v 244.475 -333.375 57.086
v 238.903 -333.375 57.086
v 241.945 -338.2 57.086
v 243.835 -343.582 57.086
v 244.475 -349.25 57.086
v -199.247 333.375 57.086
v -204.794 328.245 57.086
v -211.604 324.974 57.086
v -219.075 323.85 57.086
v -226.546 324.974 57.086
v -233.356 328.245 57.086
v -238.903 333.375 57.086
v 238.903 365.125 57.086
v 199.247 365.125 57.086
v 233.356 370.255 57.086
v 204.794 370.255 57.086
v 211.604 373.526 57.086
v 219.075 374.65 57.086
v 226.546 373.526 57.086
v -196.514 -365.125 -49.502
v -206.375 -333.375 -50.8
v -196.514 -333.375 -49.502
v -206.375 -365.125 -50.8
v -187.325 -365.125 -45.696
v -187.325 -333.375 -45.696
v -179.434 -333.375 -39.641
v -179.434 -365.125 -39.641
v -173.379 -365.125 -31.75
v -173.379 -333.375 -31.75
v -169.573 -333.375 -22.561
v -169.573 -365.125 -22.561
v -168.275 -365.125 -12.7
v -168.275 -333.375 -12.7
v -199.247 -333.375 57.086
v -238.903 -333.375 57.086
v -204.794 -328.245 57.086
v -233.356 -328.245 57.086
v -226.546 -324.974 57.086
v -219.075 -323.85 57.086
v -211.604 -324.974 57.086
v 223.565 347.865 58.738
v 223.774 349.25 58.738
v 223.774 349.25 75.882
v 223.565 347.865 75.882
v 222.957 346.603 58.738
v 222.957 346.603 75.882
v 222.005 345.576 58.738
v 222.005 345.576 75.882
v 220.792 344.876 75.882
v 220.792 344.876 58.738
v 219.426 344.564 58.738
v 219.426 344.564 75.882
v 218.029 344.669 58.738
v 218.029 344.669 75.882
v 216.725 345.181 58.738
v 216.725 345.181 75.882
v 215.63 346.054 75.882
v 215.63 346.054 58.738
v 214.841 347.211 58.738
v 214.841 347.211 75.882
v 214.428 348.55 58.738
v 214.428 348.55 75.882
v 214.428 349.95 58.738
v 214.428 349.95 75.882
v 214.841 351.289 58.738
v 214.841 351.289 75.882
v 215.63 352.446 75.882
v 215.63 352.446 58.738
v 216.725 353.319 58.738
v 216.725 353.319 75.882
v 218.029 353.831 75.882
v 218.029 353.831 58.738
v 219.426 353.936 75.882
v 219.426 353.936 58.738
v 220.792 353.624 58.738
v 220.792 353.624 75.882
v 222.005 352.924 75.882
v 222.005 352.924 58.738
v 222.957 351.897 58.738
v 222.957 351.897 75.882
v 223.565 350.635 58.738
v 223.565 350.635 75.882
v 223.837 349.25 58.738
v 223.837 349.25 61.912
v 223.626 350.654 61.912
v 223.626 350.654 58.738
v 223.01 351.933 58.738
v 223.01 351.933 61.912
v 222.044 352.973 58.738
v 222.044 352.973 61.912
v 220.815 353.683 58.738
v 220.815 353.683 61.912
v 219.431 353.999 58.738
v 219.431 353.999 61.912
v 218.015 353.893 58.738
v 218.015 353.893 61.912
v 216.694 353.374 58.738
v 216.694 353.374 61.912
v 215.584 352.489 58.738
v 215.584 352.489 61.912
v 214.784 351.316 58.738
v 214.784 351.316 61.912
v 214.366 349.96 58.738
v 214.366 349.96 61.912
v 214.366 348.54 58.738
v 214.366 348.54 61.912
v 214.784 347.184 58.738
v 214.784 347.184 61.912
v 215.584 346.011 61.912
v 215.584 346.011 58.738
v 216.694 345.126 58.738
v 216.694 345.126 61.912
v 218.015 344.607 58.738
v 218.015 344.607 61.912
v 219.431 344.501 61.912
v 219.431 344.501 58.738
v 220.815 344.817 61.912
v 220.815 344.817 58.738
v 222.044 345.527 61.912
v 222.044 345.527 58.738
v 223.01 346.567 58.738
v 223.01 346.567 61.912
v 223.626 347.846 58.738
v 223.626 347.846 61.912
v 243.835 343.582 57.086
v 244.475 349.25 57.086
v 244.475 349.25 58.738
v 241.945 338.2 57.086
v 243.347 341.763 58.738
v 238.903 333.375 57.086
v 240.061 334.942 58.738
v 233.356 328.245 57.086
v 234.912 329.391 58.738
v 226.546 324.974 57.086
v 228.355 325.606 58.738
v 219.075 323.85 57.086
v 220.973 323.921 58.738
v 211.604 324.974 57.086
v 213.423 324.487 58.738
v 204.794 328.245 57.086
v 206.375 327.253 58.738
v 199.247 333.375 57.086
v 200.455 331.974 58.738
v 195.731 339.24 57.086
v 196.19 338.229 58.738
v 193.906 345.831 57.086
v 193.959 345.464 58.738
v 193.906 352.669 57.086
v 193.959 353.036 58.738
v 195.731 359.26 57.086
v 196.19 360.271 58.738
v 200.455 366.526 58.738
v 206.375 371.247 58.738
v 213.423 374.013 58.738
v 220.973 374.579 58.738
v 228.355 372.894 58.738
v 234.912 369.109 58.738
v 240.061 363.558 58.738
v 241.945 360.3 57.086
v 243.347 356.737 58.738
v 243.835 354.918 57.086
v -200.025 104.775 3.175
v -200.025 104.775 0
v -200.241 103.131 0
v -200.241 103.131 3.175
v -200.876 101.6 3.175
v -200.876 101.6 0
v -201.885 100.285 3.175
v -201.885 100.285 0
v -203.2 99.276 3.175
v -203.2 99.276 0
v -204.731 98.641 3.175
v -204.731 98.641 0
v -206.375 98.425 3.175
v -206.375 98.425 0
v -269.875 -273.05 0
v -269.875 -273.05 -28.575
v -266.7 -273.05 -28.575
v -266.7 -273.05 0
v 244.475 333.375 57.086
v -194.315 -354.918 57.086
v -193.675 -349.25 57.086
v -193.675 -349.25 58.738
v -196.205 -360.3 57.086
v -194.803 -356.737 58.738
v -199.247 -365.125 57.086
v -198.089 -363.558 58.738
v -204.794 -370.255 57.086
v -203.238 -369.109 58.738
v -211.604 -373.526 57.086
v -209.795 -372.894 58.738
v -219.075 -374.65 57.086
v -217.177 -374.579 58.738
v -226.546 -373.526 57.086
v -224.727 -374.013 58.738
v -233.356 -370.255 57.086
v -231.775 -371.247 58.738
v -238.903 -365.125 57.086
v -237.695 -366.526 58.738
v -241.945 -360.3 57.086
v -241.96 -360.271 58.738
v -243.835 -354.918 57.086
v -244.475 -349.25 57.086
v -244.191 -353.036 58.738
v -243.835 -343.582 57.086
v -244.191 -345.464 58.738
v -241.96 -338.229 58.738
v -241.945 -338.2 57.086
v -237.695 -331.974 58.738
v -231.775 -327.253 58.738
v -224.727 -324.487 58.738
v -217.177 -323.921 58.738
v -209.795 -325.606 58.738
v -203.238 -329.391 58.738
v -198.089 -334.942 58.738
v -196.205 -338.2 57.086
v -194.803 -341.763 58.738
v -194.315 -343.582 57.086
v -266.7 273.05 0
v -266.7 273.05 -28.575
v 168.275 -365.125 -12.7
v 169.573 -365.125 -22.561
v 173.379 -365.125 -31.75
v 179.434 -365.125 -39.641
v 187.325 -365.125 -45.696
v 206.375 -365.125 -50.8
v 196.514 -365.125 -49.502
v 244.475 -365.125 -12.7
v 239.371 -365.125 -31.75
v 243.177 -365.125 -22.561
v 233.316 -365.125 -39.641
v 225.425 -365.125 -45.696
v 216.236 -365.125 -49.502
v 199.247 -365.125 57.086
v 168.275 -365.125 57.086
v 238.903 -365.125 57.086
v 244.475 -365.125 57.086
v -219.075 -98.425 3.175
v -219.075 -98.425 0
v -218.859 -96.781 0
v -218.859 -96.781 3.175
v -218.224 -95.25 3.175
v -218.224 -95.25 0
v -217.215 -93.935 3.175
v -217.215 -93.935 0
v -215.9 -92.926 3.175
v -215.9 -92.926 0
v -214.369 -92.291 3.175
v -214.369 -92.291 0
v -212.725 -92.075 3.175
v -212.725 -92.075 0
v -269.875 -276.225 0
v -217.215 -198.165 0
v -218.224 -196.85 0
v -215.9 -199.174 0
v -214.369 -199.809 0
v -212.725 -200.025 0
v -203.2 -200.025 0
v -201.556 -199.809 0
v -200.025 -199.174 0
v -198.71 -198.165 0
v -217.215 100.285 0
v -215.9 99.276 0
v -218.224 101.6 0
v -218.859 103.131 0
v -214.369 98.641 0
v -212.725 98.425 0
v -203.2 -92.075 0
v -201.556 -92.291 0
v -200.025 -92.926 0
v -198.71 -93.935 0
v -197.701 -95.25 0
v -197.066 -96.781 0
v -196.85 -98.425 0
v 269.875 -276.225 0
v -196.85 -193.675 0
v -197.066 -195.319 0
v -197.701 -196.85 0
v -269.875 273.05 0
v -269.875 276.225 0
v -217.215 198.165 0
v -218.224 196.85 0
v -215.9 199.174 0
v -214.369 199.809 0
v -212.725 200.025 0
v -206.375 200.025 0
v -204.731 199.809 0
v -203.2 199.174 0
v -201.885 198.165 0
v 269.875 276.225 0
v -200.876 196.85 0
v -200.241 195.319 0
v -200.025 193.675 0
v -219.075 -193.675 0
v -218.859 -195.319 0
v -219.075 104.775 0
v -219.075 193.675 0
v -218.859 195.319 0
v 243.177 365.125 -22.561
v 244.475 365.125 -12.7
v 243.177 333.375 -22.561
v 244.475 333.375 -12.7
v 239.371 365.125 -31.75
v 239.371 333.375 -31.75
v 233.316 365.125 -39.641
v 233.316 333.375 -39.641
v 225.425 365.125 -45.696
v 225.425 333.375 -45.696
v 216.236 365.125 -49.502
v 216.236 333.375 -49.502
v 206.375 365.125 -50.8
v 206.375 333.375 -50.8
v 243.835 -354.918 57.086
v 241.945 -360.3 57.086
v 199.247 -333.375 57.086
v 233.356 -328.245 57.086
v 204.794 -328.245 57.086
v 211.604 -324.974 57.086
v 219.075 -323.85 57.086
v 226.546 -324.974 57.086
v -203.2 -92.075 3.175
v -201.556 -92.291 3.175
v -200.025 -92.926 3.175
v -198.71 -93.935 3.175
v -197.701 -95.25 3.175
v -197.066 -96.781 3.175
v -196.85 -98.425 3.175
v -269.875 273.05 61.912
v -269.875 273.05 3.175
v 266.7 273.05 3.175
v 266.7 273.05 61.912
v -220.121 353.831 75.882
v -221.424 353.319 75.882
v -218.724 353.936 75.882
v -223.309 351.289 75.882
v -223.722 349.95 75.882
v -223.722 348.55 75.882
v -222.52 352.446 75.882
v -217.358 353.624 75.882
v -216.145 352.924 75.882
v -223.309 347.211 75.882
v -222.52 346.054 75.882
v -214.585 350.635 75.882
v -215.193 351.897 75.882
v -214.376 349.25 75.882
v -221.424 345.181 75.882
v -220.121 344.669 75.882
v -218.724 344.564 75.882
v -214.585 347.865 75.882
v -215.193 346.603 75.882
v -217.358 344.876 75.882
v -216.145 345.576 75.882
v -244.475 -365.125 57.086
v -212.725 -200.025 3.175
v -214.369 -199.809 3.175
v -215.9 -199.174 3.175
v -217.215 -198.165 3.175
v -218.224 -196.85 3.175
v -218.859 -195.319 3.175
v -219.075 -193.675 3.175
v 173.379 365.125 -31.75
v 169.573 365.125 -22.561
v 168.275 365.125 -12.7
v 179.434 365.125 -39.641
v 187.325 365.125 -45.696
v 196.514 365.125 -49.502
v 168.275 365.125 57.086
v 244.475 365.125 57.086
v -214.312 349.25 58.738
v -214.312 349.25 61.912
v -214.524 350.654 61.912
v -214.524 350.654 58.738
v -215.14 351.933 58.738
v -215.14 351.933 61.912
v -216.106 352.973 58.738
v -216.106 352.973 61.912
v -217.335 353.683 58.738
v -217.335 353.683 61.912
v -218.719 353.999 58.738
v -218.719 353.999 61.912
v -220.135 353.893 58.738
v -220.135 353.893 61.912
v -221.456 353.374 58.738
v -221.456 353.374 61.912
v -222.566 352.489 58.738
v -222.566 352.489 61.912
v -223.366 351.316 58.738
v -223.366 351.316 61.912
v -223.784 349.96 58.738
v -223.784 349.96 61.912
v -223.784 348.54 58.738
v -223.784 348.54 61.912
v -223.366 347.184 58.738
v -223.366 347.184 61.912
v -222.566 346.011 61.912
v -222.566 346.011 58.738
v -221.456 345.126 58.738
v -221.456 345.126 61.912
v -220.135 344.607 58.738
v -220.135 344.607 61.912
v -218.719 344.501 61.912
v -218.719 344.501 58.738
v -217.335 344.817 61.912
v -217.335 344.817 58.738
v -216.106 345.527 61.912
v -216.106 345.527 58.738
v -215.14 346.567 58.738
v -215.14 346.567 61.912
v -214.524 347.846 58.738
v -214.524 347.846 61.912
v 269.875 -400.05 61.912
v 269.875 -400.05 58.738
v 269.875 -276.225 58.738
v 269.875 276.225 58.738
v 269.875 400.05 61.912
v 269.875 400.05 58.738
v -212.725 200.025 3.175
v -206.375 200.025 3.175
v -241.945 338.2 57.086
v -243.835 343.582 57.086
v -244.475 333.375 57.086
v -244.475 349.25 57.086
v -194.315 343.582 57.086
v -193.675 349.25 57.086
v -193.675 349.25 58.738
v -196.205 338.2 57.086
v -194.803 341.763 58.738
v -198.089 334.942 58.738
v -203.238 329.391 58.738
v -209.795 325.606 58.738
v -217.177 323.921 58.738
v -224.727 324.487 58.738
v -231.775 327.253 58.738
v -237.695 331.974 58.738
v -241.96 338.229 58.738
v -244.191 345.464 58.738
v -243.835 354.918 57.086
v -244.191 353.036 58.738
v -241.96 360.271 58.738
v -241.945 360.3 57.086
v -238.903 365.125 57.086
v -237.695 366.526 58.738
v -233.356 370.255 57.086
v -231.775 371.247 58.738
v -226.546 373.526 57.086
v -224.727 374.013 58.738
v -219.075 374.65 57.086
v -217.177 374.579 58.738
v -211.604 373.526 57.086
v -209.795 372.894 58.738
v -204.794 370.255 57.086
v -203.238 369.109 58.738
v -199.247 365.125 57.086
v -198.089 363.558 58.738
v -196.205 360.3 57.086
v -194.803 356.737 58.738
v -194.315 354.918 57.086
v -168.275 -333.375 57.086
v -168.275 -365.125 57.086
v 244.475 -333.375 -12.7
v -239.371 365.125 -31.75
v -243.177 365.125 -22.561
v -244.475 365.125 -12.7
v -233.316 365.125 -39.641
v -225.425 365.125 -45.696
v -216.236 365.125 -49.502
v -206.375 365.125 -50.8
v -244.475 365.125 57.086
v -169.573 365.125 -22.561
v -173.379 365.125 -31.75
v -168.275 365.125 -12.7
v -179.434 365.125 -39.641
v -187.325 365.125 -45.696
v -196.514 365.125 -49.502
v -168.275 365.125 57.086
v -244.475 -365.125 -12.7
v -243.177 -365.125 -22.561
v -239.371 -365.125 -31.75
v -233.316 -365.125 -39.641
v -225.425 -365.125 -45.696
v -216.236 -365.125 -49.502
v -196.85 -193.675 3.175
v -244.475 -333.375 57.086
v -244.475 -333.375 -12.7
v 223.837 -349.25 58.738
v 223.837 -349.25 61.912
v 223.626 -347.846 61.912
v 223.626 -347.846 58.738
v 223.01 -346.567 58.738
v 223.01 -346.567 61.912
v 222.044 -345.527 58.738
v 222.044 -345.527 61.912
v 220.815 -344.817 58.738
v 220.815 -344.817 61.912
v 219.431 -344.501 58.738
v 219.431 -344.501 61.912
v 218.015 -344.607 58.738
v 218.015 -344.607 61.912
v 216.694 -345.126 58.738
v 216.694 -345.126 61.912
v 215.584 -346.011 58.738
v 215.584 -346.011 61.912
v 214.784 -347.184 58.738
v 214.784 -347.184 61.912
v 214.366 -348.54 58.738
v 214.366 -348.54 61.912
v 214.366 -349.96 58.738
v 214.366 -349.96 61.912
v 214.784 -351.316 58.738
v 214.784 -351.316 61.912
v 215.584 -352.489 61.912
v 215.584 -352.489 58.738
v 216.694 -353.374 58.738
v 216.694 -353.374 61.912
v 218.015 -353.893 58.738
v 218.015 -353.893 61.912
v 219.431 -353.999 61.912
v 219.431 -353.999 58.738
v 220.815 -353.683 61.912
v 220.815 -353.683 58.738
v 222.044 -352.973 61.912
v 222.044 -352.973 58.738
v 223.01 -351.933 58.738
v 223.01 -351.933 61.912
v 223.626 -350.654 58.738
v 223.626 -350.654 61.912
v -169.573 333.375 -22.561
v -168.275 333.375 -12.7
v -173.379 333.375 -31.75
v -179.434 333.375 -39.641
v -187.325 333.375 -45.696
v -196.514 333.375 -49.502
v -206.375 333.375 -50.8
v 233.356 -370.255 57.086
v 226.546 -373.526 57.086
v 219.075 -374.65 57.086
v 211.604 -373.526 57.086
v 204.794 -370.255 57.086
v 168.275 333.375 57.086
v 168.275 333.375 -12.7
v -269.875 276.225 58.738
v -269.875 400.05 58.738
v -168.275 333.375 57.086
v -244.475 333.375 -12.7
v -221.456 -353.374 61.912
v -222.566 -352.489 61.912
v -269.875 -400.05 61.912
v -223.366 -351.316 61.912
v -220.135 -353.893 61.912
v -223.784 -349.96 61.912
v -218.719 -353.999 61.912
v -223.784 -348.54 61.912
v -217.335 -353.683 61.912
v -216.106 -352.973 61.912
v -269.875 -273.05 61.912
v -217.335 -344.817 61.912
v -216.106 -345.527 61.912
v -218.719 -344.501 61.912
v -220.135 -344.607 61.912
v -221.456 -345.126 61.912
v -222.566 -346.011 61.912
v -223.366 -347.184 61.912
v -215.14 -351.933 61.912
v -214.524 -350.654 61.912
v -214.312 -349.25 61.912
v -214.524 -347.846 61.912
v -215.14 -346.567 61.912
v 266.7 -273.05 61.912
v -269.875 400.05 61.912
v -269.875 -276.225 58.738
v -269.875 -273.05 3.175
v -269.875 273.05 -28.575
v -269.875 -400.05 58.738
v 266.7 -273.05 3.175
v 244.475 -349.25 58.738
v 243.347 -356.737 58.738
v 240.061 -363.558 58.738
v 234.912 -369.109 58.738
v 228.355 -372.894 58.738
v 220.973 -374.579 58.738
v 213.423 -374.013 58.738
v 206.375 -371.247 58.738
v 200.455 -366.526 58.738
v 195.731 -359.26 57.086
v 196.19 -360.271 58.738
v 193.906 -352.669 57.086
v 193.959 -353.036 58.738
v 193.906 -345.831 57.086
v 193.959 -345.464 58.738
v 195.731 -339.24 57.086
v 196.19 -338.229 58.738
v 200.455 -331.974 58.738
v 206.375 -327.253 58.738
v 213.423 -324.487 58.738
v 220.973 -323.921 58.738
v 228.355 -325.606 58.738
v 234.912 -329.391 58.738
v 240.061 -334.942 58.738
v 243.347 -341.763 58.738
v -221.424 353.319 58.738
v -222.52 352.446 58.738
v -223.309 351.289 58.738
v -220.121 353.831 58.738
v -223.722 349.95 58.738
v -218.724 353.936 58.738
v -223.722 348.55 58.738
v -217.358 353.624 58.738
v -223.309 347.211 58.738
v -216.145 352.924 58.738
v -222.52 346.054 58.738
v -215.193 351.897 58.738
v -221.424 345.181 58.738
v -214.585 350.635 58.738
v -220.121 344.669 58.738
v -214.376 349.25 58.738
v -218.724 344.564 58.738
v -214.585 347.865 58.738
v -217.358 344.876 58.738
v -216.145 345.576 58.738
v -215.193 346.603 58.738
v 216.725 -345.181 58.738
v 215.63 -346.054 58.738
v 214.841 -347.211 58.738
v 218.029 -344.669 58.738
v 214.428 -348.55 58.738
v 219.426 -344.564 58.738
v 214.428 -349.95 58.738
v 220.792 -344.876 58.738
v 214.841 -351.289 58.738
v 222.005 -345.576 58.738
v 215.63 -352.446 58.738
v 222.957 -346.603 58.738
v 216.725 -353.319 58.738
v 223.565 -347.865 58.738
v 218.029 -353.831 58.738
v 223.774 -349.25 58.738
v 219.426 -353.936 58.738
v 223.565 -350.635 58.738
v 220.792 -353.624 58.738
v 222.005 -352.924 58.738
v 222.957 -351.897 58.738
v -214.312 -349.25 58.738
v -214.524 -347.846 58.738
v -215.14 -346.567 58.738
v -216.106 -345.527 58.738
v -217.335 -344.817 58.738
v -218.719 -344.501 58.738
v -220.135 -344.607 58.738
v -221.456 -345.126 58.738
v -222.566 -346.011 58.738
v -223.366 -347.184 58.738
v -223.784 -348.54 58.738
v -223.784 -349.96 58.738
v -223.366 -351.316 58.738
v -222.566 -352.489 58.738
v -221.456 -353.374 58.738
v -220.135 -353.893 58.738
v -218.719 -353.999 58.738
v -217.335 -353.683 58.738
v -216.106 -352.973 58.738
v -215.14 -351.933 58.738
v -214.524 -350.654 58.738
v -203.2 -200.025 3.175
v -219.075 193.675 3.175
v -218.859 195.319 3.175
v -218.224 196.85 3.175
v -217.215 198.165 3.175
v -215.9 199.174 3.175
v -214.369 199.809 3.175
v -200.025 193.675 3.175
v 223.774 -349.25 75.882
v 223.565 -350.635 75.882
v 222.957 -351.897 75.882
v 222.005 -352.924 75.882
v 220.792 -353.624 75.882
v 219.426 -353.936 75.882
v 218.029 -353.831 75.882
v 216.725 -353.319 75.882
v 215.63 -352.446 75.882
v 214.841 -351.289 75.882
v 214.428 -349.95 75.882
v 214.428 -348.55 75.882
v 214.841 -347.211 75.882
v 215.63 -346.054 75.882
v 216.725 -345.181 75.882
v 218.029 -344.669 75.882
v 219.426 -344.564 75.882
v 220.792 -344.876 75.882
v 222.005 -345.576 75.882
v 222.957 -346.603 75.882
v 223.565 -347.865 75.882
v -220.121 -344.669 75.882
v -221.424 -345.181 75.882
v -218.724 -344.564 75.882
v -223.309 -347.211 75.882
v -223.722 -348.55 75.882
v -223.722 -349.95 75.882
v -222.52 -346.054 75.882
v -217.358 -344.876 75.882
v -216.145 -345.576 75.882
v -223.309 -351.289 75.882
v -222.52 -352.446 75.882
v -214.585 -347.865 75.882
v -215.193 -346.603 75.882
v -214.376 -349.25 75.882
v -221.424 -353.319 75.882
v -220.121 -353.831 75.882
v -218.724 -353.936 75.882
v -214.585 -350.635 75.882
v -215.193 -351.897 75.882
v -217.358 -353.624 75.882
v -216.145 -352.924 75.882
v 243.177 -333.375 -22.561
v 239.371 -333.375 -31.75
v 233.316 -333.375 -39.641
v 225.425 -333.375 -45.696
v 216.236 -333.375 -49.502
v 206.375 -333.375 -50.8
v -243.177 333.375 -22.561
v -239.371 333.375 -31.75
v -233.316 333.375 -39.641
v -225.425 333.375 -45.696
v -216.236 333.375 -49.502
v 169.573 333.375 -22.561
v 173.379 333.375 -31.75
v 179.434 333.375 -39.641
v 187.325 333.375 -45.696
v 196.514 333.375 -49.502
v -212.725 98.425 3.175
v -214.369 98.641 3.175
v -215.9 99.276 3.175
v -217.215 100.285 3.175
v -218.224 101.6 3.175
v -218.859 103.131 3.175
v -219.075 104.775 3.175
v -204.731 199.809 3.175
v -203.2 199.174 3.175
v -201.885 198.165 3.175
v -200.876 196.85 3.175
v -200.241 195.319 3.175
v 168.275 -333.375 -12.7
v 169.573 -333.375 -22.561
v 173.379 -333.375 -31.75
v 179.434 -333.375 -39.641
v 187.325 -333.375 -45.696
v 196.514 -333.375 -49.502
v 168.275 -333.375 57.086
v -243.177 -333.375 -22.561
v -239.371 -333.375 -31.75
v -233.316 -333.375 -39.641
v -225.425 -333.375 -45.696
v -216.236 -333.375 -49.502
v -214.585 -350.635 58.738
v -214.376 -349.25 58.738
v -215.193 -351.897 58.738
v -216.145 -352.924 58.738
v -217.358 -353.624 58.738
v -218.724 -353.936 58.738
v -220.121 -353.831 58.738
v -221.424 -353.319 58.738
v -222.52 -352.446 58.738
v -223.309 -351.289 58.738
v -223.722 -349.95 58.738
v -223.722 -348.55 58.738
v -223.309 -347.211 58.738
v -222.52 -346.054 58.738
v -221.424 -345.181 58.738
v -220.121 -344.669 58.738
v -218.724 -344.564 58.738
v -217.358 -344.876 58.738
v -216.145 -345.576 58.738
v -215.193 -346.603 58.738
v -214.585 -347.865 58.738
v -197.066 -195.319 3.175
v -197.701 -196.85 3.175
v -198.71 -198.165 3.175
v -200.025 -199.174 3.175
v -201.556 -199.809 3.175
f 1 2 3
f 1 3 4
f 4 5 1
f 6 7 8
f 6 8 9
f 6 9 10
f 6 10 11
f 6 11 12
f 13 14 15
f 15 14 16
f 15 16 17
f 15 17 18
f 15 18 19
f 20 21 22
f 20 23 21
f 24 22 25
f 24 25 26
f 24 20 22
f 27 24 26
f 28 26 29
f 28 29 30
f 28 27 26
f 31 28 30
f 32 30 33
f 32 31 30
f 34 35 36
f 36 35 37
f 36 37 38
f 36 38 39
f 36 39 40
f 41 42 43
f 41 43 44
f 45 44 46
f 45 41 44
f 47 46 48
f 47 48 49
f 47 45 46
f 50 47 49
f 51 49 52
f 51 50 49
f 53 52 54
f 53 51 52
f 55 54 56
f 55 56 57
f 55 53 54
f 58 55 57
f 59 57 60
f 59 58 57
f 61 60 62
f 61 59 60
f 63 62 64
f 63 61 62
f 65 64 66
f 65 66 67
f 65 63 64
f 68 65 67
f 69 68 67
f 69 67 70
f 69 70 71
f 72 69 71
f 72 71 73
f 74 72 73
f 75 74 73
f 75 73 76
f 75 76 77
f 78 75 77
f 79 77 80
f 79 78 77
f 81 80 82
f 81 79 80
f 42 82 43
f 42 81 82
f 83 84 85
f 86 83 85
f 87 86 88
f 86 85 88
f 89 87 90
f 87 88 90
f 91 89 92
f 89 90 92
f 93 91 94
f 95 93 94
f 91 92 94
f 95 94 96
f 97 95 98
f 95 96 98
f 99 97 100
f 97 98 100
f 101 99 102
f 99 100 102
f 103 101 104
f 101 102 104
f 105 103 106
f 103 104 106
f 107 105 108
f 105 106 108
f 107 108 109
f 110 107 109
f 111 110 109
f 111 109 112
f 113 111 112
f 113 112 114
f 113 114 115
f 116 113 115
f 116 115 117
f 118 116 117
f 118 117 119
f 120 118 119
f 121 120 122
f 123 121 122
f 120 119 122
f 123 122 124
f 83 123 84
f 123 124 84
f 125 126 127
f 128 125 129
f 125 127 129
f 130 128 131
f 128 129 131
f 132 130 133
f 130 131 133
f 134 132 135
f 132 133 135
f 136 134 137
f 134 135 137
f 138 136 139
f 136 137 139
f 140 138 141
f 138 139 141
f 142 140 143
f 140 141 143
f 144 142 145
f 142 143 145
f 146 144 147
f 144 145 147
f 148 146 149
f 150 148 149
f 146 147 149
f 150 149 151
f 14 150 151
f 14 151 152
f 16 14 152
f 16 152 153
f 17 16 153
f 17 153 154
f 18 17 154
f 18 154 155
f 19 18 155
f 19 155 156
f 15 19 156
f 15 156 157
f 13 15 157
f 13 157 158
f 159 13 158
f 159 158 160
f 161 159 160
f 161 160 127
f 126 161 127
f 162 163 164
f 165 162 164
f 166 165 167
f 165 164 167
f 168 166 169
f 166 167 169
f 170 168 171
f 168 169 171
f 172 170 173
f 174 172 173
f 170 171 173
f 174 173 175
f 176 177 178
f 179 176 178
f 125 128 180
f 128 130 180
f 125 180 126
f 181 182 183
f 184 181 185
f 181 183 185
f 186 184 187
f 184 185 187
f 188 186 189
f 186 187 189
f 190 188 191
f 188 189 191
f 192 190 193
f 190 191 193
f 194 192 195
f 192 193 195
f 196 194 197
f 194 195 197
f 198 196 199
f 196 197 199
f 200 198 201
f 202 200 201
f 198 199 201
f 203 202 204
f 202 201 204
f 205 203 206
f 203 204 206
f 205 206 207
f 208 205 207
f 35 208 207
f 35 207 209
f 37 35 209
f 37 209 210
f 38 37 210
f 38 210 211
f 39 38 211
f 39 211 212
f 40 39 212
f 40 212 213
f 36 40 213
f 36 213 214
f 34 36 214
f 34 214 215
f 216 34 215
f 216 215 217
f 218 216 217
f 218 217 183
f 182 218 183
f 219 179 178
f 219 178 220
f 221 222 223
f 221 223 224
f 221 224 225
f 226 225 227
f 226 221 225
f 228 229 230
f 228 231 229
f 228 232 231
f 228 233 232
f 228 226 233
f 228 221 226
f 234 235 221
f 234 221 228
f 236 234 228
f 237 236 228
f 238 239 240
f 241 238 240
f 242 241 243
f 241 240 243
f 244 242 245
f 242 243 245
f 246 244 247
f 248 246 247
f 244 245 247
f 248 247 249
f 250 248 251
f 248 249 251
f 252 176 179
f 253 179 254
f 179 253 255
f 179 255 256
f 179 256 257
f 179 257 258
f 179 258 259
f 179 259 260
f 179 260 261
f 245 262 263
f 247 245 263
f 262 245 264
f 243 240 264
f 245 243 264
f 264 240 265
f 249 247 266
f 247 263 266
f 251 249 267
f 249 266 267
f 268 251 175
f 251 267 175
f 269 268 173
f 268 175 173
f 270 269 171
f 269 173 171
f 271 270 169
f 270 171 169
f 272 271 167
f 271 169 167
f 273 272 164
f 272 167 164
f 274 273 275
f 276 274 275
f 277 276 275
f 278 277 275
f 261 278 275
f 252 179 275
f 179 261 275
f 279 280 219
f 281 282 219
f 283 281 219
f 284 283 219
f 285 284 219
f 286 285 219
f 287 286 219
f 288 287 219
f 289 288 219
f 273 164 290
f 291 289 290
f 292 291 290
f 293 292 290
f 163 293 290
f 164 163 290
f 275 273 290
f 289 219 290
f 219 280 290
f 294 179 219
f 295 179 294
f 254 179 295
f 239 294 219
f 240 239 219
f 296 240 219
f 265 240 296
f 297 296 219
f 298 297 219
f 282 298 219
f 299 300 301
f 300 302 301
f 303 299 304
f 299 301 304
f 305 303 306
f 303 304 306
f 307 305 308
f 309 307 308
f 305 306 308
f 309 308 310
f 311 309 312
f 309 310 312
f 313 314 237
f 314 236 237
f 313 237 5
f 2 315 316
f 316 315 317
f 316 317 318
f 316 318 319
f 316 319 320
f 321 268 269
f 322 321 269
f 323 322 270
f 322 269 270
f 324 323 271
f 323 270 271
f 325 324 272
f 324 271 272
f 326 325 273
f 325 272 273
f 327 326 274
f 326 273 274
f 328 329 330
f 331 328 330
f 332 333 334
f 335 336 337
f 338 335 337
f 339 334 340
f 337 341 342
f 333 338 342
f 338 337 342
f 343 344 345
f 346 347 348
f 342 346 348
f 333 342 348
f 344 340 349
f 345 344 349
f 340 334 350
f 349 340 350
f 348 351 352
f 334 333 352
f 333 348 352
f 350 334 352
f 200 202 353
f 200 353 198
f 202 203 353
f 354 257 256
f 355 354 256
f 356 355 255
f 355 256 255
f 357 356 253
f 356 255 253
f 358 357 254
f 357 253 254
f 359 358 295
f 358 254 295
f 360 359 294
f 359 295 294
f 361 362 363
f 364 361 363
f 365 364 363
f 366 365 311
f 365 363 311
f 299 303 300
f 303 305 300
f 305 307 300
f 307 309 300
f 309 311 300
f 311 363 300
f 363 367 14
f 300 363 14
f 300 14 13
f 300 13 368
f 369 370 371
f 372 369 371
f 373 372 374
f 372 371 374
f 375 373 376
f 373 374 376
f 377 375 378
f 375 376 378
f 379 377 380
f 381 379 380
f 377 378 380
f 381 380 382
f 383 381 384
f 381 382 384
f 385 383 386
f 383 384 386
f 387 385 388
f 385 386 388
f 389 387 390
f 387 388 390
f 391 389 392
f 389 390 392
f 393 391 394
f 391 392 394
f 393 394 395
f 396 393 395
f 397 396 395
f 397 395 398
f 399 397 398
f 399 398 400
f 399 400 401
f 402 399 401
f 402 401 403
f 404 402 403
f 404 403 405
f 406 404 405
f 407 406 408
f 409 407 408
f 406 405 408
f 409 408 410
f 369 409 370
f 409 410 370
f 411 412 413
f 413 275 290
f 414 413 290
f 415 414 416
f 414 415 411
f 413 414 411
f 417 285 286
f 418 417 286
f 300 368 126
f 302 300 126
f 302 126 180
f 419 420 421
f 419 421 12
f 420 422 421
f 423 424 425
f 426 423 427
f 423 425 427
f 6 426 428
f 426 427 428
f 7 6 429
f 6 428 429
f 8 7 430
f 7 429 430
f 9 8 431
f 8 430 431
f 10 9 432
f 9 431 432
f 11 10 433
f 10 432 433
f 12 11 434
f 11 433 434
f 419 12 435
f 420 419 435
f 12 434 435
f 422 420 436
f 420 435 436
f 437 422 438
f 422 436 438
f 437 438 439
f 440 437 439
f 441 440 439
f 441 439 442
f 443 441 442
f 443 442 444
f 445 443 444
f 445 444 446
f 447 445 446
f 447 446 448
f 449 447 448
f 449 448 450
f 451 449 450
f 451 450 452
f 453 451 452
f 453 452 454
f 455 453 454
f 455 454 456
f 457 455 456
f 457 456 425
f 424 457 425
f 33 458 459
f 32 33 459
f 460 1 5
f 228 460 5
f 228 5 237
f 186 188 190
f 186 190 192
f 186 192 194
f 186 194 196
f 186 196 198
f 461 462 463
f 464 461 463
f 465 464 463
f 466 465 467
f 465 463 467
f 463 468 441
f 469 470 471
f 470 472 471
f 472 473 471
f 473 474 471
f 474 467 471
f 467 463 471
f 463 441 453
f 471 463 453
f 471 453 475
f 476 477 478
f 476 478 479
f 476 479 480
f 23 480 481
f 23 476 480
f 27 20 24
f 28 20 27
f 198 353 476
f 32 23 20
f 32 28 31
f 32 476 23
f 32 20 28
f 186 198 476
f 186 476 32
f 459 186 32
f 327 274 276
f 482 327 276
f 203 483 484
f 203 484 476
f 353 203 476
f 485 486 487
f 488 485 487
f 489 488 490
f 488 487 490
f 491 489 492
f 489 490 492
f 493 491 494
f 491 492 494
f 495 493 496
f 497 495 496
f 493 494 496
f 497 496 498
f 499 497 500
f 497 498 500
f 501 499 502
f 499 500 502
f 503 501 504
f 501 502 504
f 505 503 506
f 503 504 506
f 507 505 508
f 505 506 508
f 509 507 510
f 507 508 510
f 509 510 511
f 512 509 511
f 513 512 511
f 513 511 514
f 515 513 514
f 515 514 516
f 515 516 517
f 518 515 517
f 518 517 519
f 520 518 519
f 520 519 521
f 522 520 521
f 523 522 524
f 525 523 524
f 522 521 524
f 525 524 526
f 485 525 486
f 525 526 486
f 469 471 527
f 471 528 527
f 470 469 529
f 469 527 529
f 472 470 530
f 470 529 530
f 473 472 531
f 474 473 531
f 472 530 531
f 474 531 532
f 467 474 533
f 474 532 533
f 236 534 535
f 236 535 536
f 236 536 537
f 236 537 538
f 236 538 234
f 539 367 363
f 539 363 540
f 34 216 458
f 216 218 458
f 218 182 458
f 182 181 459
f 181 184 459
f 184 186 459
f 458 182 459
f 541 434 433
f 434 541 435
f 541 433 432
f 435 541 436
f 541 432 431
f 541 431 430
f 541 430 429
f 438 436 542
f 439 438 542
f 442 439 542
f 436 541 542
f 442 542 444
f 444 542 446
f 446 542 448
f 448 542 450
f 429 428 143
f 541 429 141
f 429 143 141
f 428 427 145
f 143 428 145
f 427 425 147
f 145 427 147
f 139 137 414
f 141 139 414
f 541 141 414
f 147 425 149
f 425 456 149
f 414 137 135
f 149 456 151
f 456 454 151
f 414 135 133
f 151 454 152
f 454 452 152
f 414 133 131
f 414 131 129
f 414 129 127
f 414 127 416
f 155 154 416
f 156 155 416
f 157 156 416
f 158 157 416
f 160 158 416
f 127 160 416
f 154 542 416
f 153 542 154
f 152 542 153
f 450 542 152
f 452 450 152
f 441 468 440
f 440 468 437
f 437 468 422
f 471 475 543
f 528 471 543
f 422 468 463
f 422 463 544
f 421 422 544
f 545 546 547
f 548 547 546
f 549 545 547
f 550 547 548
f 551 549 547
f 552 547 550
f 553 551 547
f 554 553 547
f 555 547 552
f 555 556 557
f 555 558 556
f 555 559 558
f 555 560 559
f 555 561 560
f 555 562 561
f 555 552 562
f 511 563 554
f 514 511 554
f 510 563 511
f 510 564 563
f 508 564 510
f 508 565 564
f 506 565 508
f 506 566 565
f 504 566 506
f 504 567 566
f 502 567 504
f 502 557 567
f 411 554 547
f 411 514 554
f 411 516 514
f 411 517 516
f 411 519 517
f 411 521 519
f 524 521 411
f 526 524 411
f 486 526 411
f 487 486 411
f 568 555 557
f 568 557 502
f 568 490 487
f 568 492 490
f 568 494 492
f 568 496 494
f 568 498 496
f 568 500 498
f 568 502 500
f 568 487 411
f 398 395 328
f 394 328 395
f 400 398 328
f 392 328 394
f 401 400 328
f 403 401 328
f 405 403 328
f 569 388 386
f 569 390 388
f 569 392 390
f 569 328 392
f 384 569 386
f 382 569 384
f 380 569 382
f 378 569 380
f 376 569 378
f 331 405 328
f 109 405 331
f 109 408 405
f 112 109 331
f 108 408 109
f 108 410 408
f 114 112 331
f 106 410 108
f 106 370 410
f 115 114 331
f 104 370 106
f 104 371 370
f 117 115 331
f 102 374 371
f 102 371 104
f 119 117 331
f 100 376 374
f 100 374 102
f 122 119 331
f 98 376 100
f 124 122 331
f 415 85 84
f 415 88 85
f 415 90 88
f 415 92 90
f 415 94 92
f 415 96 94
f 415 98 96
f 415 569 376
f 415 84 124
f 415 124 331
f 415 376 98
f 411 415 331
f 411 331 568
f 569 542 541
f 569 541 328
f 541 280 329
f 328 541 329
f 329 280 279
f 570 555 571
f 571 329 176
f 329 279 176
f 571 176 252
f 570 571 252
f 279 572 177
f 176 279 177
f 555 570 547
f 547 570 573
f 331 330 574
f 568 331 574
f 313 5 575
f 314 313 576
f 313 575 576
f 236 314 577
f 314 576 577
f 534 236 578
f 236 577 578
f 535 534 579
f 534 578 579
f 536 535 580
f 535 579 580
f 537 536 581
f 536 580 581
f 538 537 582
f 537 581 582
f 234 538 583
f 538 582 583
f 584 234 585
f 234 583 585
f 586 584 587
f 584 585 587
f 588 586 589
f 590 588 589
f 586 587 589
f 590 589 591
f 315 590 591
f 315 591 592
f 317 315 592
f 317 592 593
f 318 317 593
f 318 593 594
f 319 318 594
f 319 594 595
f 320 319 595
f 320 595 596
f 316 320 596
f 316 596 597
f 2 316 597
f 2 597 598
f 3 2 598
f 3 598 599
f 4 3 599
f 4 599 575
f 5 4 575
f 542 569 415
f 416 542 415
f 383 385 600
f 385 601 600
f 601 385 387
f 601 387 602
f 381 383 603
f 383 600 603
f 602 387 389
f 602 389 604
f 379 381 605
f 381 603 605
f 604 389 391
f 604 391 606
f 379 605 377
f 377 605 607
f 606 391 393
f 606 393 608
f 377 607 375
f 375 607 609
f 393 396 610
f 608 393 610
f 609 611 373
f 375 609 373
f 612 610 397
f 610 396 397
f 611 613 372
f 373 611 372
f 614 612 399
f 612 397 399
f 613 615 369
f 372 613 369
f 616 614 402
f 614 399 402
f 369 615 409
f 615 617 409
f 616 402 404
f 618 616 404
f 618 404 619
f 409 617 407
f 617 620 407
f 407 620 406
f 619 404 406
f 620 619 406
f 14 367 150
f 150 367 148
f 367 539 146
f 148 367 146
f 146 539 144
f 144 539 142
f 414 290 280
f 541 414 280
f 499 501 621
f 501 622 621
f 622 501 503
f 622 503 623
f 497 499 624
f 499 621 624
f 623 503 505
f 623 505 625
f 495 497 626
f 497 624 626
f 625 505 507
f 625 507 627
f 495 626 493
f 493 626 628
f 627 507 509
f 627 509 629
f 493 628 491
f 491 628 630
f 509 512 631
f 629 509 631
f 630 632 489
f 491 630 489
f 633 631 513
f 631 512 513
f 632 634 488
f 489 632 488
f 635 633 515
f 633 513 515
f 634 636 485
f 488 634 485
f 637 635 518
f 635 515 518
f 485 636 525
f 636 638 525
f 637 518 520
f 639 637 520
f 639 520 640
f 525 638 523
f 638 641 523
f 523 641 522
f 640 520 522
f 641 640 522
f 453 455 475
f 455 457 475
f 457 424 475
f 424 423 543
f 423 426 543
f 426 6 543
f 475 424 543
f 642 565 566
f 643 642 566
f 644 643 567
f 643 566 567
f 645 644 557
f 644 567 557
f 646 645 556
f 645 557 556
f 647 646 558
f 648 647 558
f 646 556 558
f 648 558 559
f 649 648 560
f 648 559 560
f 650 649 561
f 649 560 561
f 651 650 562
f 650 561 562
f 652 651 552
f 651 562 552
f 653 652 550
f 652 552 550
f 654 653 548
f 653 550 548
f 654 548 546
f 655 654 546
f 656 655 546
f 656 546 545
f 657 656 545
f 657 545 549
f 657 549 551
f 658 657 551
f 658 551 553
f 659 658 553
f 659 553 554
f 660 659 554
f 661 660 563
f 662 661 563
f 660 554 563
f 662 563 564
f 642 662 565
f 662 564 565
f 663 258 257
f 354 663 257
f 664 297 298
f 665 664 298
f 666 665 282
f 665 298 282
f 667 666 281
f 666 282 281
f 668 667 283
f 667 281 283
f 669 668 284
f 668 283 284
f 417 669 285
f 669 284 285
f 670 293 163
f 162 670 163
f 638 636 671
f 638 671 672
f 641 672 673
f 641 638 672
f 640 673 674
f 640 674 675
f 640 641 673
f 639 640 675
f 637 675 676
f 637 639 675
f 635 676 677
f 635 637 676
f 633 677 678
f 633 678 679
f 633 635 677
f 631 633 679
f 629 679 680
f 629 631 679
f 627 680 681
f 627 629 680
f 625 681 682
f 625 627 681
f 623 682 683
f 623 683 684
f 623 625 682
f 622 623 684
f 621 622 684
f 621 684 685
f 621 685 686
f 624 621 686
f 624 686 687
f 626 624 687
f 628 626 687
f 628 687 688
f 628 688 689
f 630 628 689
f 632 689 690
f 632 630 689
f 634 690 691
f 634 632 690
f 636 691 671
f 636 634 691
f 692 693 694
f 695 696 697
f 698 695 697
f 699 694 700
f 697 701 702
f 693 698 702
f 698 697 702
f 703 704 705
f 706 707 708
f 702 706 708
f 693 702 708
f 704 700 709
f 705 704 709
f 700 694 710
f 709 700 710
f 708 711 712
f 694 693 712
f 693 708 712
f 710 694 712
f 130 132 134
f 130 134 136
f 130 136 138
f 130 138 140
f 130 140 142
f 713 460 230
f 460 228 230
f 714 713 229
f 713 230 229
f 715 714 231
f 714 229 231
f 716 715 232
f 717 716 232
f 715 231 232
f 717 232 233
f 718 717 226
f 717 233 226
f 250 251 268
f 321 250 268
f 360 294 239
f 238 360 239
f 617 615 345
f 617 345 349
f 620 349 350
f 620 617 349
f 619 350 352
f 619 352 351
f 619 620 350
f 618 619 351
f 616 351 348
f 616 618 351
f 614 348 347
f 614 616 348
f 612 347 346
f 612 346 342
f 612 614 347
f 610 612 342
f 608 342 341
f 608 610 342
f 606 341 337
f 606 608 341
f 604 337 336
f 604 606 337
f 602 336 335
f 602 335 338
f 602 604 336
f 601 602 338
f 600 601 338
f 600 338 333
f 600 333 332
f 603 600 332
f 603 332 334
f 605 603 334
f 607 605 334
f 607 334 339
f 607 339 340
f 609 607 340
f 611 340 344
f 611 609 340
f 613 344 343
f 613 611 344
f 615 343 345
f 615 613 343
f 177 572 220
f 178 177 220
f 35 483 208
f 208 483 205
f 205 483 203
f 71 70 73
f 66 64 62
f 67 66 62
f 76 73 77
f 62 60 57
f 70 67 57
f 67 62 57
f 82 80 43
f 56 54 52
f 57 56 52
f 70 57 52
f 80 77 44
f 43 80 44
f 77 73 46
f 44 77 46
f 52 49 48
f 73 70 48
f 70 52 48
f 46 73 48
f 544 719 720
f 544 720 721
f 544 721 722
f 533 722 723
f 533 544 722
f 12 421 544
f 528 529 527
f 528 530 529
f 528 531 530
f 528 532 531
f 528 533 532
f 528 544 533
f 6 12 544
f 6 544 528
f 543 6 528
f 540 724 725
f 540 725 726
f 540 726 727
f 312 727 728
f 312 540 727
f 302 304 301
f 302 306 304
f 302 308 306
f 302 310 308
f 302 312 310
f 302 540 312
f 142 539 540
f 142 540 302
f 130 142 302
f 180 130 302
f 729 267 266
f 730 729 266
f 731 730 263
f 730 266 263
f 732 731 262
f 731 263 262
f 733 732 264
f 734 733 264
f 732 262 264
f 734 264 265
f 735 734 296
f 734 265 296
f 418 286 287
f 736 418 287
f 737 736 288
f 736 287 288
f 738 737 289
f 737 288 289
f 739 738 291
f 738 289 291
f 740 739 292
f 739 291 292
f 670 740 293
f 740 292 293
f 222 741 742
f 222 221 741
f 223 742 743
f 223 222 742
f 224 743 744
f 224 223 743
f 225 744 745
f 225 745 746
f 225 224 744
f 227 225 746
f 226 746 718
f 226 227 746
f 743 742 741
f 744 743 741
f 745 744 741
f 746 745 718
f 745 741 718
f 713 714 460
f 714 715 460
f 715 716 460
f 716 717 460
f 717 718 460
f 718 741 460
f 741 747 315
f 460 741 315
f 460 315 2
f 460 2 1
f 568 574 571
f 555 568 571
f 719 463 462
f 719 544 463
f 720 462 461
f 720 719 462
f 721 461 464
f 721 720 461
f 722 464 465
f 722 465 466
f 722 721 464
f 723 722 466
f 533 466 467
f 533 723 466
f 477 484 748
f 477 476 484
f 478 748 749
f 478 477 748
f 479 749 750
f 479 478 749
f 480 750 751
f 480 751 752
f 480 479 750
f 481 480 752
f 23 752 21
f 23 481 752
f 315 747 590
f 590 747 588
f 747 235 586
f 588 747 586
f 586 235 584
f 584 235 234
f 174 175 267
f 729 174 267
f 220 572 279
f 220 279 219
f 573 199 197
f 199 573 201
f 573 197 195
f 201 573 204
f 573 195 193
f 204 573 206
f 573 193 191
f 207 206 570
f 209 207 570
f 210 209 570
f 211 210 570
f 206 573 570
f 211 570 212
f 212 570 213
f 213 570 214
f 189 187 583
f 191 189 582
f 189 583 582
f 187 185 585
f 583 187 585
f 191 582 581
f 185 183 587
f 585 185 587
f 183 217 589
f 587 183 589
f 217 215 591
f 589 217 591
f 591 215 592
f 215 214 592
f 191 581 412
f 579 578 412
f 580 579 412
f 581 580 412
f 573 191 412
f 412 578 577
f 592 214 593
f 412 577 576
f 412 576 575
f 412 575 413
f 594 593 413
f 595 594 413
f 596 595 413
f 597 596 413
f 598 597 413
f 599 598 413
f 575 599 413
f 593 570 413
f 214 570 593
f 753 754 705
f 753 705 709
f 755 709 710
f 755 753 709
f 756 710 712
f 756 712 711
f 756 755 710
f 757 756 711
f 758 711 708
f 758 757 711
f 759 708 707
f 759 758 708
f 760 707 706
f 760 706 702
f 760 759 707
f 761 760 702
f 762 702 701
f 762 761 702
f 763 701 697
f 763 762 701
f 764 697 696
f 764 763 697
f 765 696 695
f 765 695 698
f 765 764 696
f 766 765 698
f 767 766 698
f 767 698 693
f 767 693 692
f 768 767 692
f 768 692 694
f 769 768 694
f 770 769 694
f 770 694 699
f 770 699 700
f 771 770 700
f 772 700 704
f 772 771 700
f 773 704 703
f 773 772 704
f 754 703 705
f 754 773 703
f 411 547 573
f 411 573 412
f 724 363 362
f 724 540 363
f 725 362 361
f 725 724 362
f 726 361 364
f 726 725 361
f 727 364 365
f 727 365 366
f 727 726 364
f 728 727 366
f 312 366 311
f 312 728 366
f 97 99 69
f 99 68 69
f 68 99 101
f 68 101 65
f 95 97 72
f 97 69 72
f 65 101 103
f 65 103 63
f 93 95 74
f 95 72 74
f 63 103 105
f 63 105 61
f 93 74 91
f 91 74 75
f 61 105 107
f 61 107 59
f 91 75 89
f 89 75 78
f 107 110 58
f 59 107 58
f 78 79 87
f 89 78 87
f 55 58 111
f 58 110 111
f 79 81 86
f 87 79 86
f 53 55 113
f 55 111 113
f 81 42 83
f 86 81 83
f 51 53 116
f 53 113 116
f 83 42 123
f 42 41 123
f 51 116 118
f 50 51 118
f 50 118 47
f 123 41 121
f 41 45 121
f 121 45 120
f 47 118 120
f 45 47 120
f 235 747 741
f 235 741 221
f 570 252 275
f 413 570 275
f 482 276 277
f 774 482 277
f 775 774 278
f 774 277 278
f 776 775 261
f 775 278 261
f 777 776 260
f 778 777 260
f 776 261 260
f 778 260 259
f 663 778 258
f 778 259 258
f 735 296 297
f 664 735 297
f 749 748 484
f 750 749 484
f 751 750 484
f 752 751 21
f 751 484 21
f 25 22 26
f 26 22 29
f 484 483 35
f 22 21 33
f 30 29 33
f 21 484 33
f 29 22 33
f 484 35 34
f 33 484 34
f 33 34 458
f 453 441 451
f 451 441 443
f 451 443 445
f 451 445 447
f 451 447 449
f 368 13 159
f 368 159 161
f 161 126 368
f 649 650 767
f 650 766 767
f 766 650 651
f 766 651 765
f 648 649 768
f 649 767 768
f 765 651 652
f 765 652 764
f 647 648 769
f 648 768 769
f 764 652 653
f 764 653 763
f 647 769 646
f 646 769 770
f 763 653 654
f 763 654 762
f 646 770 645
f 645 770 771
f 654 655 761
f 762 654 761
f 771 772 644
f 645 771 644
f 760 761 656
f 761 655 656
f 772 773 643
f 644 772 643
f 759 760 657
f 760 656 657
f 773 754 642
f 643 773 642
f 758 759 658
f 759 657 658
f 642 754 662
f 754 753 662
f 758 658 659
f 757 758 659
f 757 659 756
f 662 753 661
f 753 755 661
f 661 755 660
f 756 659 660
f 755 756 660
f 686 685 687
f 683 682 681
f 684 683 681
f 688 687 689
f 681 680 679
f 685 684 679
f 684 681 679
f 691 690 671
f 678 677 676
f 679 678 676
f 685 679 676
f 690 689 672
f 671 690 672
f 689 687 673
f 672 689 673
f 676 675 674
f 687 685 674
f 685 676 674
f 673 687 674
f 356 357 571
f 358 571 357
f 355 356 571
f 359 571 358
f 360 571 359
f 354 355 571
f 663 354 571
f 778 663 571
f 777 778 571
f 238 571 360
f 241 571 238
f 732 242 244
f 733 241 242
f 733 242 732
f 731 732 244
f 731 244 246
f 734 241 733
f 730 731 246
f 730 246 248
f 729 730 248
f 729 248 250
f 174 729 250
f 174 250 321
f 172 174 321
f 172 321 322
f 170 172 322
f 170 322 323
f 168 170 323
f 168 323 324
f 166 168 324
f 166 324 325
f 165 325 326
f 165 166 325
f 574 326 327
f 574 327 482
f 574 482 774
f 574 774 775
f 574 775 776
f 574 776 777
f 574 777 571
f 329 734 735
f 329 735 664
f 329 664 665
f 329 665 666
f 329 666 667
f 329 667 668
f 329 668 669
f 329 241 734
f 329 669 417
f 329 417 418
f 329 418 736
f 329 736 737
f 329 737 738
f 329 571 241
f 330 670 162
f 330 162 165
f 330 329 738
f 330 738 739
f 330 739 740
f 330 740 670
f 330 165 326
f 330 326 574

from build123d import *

# Parameters (mm, degrees)
F0_W      = 539.75
F0_H      = 552.45
F1_DEPTH  = 3.175
F3_DEPTH  = 58.7375
F4_W      = 539.75
F4_H      = 127
F4_R      = 4.7625
F5_DEPTH  = 3.175
F6_R      = 4.699
F7_DEPTH  = 17.145
F8_R      = 25.4
F9_DEPTH  = 1.651
F10_W     = 76.2
F10_H     = 31.75
F11_DEPTH = 107.8865
F12_R     = 38.09999
F13_W     = 3.175
F13_H     = 546.1
F14_DEPTH = 31.75


# Not quite as in the source:
# - a fillet or chamfer is up to 0.001 mm smaller than in the source, because OpenCascade refuses the exact size


with BuildPart() as f1:
    # F0 (on Top) → F1 (new body)
    with BuildSketch(Plane.XY):
        Rectangle(F0_W, F0_H)
        with BuildLine():
            ThreePointArc((-219.075, -98.425), (-217.2151280605, -93.9348719395), (-212.725, -92.075))
            Line((-212.725, -92.075), (-203.2, -92.075))
            ThreePointArc((-203.2, -92.075), (-198.7098719395, -93.9348719395), (-196.85, -98.425))
            Line((-196.85, -98.425), (-196.85, -193.675))
            ThreePointArc((-196.85, -193.675), (-198.7098719395, -198.1651280605), (-203.2, -200.025))
            Line((-203.2, -200.025), (-212.725, -200.025))
            ThreePointArc((-212.725, -200.025), (-217.2151280605, -198.1651280605), (-219.075, -193.675))
            Line((-219.075, -193.675), (-219.075, -98.425))
        make_face(mode=Mode.SUBTRACT)
        with BuildLine():
            ThreePointArc((-219.075, 193.675), (-217.2151280605, 198.1651280605), (-212.725, 200.025))
            Line((-212.725, 200.025), (-206.375, 200.025))
            ThreePointArc((-206.375, 200.025), (-201.8848719395, 198.1651280605), (-200.025, 193.675))
            Line((-200.025, 193.675), (-200.025, 104.775))
            ThreePointArc((-200.025, 104.775), (-201.8848719395, 100.2848719395), (-206.375, 98.425))
            Line((-206.375, 98.425), (-212.725, 98.425))
            ThreePointArc((-212.725, 98.425), (-217.2151280605, 100.2848719395), (-219.075, 104.775))
            Line((-219.075, 104.775), (-219.075, 193.675))
        make_face(mode=Mode.SUBTRACT)
    extrude(amount=F1_DEPTH)

    # F2 (on face) → F3 (join)
    with BuildSketch(Plane.XY.offset(3.175)):
        Polygon((-269.875, 276.225), (-269.875, 273.05), (266.7, 273.05), (266.7, -273.05), (-269.875, -273.05), (-269.875, -276.225), (269.875, -276.225), (269.875, 276.225), align=None)
    extrude(amount=F3_DEPTH)

    # F4 (on face) → F5 (join)
    with BuildSketch(Plane.XY.offset(61.9125)):
        with Locations((0, 336.55)):
            Rectangle(F4_W, F4_H)
        with Locations((-219.075, 349.25)):
            Circle(F4_R, mode=Mode.SUBTRACT)
        with Locations((219.075, 349.25)):
            Circle(F4_R, mode=Mode.SUBTRACT)
        with Locations((0, -336.55)):
            Rectangle(F4_W, F4_H)
        with Locations((-219.075, -349.25)):
            Circle(F4_R, mode=Mode.SUBTRACT)
        with Locations((219.075, -349.25)):
            Circle(F4_R, mode=Mode.SUBTRACT)
    extrude(amount=-F5_DEPTH)



with BuildPart() as f7:
    # F6 (on face) → F7 (new body)
    with BuildSketch(Plane(origin=(0, 0, 58.7375), x_dir=(1, 0, 0), z_dir=(0, 0, -1))):
        with Locations((-219.075, 349.25)):
            Circle(F6_R)
    extrude(amount=-F7_DEPTH)


with BuildPart() as f7b:
    # F6 (on face) → F7, piece 2 (new body)
    with BuildSketch(Plane(origin=(0, 0, 58.7375), x_dir=(1, 0, 0), z_dir=(0, 0, -1))):
        with Locations((219.075, 349.25)):
            Circle(F6_R)
    extrude(amount=-F7_DEPTH)


with BuildPart() as f7c:
    # F6 (on face) → F7, piece 3 (new body)
    with BuildSketch(Plane(origin=(0, 0, 58.7375), x_dir=(1, 0, 0), z_dir=(0, 0, -1))):
        with Locations((-219.075, -349.25)):
            Circle(F6_R)
    extrude(amount=-F7_DEPTH)


with BuildPart() as f7d:
    # F6 (on face) → F7, piece 4 (new body)
    with BuildSketch(Plane(origin=(0, 0, 58.7375), x_dir=(1, 0, 0), z_dir=(0, 0, -1))):
        with Locations((219.075, -349.25)):
            Circle(F6_R)
    extrude(amount=-F7_DEPTH)


with BuildPart() as f1_1:
    add(f1.part)

    add(f7.part)  # F9 merges F7

    add(f7b.part)  # F9 merges F7b

    add(f7c.part)  # F9 merges F7c

    add(f7d.part)  # F9 merges F7d
    # F8 (on face) → F9 (join)
    with BuildSketch(Plane(origin=(0, 0, 58.7375), x_dir=(1, 0, 0), z_dir=(0, 0, -1))):
        with Locations((-219.075, 349.25)):
            Circle(F8_R)
        with Locations((219.075, 349.25)):
            Circle(F8_R)
        with Locations((-219.075, -349.25)):
            Circle(F8_R)
        with Locations((219.075, -349.25)):
            Circle(F8_R)
    extrude(amount=F9_DEPTH)

    # F10 (on face) → F11 (join)
    with BuildSketch(Plane(origin=(0, 0, 57.0865), x_dir=(1, 0, 0), z_dir=(0, 0, -1))):
        with Locations((-206.375, 349.25)):
            Rectangle(F10_W, F10_H)
        with Locations((206.375, 349.25)):
            Rectangle(F10_W, F10_H)
        with Locations((-206.375, -349.25)):
            Rectangle(F10_W, F10_H)
        with Locations((206.375, -349.25)):
            Rectangle(F10_W, F10_H)
    extrude(amount=F11_DEPTH)

    # F12 (radius 38.1 in the source; OpenCascade refuses exactly that, so slightly less here)
    f12_edges = [f1_1.edges().sort_by_distance(p)[0] for p in [
        (-168.275, -349.25, -50.8),
        (-244.475, -349.25, -50.8),
        (168.275, -349.25, -50.8),
        (244.475, -349.25, -50.8),
        (-244.475, 349.25, -50.8),
        (-168.275, 349.25, -50.8),
        (168.275, 349.25, -50.8),
        (244.475, 349.25, -50.8),
    ]]
    fillet(f12_edges, radius=F12_R)

    # F13 (on face) → F14 (join)
    with BuildSketch(Plane.XY.offset(3.175)):
        with Locations((-268.2875, 0)):
            Rectangle(F13_W, F13_H)
    extrude(amount=-F14_DEPTH)


solid = f1_1.part
